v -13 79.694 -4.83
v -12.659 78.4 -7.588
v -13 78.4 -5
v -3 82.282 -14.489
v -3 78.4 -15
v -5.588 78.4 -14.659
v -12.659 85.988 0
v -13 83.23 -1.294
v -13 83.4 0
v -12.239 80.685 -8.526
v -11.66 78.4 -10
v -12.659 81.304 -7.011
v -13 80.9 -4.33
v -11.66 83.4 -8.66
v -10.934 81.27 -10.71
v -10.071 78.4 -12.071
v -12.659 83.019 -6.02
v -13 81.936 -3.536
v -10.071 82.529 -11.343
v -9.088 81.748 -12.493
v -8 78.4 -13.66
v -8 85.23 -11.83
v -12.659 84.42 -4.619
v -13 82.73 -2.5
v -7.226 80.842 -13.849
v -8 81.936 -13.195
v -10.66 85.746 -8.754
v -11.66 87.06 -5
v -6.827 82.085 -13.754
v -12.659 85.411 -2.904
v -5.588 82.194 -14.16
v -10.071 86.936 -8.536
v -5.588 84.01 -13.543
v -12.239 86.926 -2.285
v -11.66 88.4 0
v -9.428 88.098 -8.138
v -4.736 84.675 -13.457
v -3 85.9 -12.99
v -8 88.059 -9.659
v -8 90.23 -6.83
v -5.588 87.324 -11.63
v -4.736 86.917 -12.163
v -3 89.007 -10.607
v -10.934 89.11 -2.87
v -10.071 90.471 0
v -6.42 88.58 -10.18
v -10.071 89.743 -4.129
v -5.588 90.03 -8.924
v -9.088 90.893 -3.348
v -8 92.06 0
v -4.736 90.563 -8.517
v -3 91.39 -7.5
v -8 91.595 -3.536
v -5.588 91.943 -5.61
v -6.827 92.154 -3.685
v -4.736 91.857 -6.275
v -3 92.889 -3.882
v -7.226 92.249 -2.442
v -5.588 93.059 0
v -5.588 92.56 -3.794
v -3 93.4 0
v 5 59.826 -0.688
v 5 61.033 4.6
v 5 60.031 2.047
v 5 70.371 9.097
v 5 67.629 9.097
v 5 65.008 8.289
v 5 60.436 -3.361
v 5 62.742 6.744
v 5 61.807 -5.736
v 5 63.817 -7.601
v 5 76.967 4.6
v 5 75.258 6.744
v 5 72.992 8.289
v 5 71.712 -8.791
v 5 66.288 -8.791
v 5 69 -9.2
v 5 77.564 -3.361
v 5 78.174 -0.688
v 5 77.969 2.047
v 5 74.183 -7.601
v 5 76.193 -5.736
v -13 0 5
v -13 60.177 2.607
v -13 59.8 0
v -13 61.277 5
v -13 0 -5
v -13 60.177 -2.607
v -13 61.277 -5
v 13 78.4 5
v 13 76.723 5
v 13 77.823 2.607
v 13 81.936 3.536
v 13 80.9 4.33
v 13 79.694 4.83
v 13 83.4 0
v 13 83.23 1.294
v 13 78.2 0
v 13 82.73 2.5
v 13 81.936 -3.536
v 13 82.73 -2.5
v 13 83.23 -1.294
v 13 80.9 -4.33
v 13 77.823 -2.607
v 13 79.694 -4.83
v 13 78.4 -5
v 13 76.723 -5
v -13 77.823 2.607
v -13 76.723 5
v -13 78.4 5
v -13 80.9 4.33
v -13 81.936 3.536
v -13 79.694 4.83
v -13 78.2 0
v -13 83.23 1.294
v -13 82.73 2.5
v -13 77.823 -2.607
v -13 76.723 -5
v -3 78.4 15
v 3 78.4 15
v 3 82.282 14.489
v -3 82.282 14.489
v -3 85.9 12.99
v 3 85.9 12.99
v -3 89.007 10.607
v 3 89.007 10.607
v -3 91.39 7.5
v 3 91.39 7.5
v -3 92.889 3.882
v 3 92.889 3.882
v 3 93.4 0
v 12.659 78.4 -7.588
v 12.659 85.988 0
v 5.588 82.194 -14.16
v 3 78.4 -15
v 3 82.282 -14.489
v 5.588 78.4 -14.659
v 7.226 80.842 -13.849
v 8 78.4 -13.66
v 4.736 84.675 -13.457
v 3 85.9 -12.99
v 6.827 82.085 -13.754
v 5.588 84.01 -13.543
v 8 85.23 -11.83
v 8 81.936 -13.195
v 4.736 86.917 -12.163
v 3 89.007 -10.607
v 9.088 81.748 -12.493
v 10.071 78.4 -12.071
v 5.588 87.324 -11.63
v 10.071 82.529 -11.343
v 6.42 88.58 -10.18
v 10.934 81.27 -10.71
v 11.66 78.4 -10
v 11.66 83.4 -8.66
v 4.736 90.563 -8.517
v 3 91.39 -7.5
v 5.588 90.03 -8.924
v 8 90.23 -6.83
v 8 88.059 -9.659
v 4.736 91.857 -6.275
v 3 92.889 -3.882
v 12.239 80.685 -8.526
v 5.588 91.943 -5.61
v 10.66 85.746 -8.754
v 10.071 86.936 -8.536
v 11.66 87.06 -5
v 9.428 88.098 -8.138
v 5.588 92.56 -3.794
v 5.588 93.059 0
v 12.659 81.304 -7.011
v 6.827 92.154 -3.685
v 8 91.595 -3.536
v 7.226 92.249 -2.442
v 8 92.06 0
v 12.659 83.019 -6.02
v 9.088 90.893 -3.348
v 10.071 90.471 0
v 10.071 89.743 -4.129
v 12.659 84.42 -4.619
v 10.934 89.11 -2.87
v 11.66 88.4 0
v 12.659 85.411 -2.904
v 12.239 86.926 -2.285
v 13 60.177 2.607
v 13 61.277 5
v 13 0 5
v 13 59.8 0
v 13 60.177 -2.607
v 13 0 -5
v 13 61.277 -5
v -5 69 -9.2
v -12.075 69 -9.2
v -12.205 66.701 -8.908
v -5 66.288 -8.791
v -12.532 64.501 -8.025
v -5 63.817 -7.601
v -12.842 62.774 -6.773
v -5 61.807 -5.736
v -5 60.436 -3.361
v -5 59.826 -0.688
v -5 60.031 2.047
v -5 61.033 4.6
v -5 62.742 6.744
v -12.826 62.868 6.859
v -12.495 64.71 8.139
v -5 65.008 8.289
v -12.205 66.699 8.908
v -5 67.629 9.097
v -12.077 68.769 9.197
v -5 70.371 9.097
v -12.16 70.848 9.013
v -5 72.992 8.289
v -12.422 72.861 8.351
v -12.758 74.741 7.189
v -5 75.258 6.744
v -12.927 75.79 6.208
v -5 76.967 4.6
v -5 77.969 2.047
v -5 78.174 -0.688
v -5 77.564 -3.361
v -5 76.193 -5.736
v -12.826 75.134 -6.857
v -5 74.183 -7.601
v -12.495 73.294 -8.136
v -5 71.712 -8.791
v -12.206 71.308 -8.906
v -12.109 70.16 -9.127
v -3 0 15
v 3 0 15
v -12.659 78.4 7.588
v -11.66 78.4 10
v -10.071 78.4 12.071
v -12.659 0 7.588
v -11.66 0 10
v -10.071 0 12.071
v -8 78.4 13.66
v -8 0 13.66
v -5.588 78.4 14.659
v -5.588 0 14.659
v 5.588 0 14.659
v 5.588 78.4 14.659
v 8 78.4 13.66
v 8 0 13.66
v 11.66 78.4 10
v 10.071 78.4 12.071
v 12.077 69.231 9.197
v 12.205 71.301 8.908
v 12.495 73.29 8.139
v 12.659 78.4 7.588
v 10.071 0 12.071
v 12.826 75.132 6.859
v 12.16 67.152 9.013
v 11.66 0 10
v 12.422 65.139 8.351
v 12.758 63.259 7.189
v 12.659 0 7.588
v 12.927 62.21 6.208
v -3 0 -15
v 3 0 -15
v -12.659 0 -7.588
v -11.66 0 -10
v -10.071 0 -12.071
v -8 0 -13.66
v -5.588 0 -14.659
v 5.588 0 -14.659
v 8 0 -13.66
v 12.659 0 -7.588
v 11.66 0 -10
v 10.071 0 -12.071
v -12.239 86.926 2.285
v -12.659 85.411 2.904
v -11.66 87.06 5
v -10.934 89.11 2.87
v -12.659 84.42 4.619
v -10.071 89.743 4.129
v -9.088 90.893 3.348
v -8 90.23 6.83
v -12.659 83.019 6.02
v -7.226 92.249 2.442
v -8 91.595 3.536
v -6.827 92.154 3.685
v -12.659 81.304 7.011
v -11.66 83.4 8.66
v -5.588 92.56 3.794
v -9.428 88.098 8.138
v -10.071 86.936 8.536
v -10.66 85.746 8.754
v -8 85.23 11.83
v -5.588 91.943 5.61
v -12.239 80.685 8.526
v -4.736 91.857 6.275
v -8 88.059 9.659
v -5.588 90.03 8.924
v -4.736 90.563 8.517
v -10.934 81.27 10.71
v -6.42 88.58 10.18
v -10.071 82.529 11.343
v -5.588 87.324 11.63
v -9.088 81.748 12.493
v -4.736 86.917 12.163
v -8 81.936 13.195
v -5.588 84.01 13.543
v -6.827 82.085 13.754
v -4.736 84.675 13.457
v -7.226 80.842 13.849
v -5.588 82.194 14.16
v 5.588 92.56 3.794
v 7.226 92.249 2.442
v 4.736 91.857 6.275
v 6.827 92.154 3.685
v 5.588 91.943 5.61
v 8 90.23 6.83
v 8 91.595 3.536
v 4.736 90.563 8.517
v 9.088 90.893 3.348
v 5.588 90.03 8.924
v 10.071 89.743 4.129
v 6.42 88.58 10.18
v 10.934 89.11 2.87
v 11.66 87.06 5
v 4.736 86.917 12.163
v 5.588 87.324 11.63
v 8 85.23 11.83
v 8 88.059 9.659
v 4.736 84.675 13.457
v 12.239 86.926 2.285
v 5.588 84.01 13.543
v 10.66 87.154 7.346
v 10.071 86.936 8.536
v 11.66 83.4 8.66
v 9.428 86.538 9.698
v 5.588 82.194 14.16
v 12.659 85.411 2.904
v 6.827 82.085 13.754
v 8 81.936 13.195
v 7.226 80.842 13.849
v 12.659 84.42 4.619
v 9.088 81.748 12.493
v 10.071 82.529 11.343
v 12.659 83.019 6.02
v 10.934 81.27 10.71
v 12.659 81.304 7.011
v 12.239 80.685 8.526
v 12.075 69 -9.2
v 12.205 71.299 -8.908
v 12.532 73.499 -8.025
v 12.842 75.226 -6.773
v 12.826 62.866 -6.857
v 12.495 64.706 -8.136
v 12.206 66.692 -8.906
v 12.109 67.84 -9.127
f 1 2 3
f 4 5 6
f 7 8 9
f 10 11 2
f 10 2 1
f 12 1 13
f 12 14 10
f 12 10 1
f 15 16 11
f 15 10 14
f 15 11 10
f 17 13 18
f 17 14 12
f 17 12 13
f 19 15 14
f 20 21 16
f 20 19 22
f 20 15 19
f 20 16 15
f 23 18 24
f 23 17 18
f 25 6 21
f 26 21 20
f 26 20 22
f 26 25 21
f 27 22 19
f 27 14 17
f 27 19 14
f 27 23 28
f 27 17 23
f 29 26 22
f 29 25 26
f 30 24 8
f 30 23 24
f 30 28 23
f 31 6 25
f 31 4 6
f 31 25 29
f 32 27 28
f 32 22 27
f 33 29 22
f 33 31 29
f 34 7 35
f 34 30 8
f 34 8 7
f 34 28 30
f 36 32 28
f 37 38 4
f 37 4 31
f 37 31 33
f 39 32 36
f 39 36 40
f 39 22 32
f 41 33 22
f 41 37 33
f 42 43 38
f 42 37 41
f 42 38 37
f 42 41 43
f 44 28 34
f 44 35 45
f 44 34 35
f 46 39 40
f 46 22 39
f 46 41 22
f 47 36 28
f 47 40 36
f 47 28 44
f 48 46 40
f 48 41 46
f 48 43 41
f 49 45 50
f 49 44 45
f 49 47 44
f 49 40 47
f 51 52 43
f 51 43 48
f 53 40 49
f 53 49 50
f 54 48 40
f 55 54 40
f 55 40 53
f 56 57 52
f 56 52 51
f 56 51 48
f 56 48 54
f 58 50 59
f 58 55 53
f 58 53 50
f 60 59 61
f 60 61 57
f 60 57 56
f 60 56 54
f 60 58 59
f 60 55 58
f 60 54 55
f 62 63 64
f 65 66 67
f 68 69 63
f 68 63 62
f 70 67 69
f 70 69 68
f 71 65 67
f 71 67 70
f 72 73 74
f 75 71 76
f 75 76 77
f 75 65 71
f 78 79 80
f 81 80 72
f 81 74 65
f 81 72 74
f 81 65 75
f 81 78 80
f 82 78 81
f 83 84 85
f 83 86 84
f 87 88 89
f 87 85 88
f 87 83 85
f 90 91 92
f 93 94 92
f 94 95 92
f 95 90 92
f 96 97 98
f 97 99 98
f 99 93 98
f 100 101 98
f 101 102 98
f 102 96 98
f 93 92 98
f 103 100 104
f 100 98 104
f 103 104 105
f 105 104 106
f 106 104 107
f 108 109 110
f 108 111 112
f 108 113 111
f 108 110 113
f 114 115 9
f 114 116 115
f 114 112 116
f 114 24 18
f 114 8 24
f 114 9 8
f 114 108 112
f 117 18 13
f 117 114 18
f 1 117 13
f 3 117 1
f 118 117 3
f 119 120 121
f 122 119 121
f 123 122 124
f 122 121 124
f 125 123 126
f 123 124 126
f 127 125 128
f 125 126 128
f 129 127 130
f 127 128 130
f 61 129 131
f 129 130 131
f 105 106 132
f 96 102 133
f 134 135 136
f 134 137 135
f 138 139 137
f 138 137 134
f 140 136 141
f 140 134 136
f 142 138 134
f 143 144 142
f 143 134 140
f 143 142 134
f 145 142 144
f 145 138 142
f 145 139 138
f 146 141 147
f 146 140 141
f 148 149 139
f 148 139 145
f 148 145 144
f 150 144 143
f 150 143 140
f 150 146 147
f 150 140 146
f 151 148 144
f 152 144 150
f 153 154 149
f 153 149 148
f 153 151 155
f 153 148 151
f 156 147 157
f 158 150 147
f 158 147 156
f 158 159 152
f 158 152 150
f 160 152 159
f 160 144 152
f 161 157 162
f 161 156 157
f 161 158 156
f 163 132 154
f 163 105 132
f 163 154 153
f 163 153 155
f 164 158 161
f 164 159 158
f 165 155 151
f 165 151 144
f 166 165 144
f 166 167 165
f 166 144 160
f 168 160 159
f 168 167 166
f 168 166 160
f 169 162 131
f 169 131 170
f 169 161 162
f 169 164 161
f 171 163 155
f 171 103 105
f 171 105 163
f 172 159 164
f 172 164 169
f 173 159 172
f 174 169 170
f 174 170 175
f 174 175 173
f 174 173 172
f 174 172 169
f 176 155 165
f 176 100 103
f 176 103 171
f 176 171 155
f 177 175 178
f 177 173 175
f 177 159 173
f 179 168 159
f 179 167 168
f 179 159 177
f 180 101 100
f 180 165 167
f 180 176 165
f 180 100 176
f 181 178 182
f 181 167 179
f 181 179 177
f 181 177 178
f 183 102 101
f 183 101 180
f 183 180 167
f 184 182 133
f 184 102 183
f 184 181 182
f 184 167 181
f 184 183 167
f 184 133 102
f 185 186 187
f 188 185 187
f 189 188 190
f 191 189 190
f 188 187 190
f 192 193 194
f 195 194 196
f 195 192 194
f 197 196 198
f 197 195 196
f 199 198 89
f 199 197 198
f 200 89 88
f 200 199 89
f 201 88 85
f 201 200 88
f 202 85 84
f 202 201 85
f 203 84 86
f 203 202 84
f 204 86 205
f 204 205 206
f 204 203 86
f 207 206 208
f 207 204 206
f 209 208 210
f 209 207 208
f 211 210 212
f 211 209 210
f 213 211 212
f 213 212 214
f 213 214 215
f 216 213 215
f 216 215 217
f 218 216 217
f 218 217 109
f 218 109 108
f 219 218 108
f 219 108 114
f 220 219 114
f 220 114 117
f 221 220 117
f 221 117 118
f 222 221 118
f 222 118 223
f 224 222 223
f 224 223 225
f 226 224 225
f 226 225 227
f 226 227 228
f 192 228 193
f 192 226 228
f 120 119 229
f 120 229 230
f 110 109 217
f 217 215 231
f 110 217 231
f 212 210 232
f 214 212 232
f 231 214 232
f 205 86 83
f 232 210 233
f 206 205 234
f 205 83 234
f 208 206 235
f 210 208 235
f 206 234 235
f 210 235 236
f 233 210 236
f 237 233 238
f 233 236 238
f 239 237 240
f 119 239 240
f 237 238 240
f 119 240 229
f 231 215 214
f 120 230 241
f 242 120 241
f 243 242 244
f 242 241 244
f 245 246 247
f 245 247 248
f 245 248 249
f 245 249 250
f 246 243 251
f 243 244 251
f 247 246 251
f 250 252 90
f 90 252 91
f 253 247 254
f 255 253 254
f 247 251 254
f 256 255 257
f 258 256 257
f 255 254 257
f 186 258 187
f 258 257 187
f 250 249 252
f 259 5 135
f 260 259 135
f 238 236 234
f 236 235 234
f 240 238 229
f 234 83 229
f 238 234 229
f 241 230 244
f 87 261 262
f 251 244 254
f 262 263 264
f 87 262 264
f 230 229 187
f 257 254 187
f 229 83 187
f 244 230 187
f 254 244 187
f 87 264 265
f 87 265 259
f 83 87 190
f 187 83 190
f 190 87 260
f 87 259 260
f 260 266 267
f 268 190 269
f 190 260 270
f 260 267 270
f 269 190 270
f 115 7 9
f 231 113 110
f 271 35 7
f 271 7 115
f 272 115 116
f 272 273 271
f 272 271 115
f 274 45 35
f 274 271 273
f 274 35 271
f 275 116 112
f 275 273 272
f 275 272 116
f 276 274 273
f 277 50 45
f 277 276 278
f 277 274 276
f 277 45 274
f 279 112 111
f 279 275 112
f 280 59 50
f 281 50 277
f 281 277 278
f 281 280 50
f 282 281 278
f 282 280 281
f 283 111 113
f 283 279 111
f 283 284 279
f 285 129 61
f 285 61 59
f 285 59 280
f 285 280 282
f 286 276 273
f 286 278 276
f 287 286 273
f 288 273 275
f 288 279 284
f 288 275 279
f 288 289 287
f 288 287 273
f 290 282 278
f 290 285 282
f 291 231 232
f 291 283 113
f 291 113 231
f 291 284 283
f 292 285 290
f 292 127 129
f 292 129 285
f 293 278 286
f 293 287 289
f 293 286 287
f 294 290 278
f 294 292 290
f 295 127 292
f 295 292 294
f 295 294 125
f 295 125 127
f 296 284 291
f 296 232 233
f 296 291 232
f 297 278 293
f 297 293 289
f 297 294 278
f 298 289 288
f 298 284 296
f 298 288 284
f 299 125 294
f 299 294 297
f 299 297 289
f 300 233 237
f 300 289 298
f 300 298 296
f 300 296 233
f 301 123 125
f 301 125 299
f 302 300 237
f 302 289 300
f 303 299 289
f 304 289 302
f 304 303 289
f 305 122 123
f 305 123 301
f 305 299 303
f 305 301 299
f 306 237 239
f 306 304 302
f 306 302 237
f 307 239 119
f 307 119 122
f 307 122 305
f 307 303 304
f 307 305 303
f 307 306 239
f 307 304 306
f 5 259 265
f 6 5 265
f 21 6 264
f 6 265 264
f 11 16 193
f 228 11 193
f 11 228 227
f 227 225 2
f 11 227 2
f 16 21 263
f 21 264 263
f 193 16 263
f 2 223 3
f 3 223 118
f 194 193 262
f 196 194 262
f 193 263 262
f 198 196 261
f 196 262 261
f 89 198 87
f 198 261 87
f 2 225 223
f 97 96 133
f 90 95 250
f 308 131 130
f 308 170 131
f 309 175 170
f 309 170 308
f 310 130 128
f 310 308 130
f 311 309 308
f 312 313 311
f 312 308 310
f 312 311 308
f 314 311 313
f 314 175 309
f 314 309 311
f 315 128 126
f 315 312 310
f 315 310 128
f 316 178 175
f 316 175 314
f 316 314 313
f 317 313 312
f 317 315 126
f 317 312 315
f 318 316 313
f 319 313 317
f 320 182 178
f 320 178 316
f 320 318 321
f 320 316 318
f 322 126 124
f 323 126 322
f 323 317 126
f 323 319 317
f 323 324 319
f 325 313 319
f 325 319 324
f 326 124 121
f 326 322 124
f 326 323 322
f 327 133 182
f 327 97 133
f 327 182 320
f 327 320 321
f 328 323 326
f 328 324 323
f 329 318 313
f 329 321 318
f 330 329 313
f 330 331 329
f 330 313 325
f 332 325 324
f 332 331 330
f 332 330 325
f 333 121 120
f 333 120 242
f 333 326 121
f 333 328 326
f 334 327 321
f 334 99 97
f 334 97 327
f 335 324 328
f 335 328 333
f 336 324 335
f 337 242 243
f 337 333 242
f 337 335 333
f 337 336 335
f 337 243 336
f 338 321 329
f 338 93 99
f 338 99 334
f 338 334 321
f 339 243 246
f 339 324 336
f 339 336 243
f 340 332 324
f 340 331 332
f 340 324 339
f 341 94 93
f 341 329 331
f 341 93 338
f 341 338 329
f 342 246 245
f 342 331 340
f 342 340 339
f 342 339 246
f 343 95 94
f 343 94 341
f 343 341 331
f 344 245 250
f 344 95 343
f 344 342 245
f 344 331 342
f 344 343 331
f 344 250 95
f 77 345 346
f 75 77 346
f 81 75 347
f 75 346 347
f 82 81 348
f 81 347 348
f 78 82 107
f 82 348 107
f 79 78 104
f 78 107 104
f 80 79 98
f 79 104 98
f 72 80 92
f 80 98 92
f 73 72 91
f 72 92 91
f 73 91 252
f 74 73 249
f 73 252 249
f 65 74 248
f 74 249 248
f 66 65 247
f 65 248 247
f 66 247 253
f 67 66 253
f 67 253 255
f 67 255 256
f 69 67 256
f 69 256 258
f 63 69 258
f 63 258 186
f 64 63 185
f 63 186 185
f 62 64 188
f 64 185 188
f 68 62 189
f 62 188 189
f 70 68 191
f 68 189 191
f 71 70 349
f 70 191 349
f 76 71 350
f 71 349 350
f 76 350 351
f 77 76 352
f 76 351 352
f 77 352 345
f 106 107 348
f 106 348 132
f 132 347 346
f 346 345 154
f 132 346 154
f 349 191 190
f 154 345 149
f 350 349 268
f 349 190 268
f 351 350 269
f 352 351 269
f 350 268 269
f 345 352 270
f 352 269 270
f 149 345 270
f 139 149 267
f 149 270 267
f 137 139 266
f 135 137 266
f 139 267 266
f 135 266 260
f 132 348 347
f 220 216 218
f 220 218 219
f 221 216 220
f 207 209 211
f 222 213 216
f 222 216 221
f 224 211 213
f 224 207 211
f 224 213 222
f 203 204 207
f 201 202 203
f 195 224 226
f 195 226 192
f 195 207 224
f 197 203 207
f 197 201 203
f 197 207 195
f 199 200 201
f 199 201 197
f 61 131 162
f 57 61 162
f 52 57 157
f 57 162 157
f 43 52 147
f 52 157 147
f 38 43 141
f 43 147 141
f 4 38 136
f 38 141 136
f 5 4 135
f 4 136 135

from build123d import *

# Parameters (mm, degrees)
SKETCH2_W           = 26
SKETCH2_H           = 30
BOSS_EXTRUDE1_DEPTH = 93.4
SKETCH3_R           = 9.2
CUT_EXTRUDE1_DEPTH  = 8
CUT_EXTRUDE2_START  = -8
SKETCH4_R           = 9.2
CUT_EXTRUDE2_DEPTH  = 8
FILLET1_R           = 15
FILLET4_R           = 10
FILLET5_R           = 10


# Some blends are built 0.0001 mm under size
with BuildPart() as part:
    # Sketch2 → Boss-Extrude1 (new body)
    with BuildSketch(Plane(origin=(0, 0, 0), x_dir=(1, 0, 0), z_dir=(0, 1, 0))):
        Rectangle(SKETCH2_W, SKETCH2_H)
    extrude(amount=BOSS_EXTRUDE1_DEPTH)

    # Sketch3 → Cut-Extrude1 (cut)
    with BuildSketch(Plane(origin=(13, 0, 0), x_dir=(0, 0, -1), z_dir=(1, 0, 0))):
        with Locations((0, 69)):
            Circle(SKETCH3_R)
    extrude(amount=-CUT_EXTRUDE1_DEPTH, mode=Mode.SUBTRACT)

    # Sketch4 → Cut-Extrude2 (cut)
    with BuildSketch(Plane.ZY.offset(13).offset(CUT_EXTRUDE2_START)):
        with Locations(Location((0, 69, 0), (0, 0, 180))):
            Circle(SKETCH4_R)
    extrude(amount=CUT_EXTRUDE2_DEPTH, mode=Mode.SUBTRACT)

    # Fillet1
    fillet1_edges = [part.edges().sort_by_distance(p)[0] for p in [
        (0, 93.4, 15),
        (0, 93.4, -15),
    ]]
    fillet(fillet1_edges, radius=FILLET1_R - 0.0001)  # a hair under: the kernel refuses the full size

    # Fillet4
    # the kernel refuses this fillet: 10 mm, written as the material it takes off along each edge
    with BuildSketch(Plane(origin=(-13, -25, 15), x_dir=(0, 0, -1), z_dir=(0, 1, 0)), Plane(origin=(-13, -25, -15), x_dir=(1, 0, 0), z_dir=(0, 1, 0))) as fillet4_piece_1:
        with BuildLine():
            CenterArc((FILLET4_R, -FILLET4_R), FILLET4_R, 90, 90)
            Line((0, -FILLET4_R), (0, 0))
            Line((0, 0), (FILLET4_R, 0))
        make_face()
    extrude(amount=103.4001, mode=Mode.SUBTRACT)
    with BuildSketch(Plane(origin=(-13, 78.4001, -0.0001), x_dir=(0, 0, -1), z_dir=(0, -1, 0))) as fillet4_piece_2:
        with BuildLine():
            CenterArc((14.9999 - FILLET4_R, FILLET4_R), FILLET4_R, 270, 90)
            Line((14.9999, FILLET4_R), (14.9999, 0))
            Line((14.9999, 0), (14.9999 - FILLET4_R, 0))
        make_face()
    revolve(axis=Axis((-13, 78.4001, -0.0001), (1, 0, 0)), revolution_arc=90, mode=Mode.SUBTRACT)
    with BuildSketch(Plane(origin=(-13, 78.4001, 0.0001), x_dir=(0, 1, 0), z_dir=(0, 0, -1))) as fillet4_piece_3:
        with BuildLine():
            CenterArc((14.9999 - FILLET4_R, FILLET4_R), FILLET4_R, 270, 90)
            Line((14.9999, FILLET4_R), (14.9999, 0))
            Line((14.9999, 0), (14.9999 - FILLET4_R, 0))
        make_face()
    revolve(axis=Axis((-13, 78.4001, 0.0001), (1, 0, 0)), revolution_arc=90, mode=Mode.SUBTRACT)
    with BuildSketch(Plane(origin=(-13, 93.4, 0.0001), x_dir=(0, -1, 0), z_dir=(0, 0, -1))) as fillet4_piece_4:
        with BuildLine():
            CenterArc((FILLET4_R, -FILLET4_R), FILLET4_R, 90, 90)
            Line((0, -FILLET4_R), (0, 0))
            Line((0, 0), (FILLET4_R, 0))
        make_face()
    extrude(amount=0.0002, mode=Mode.SUBTRACT)

    # Fillet5
    # the kernel refuses this fillet: 10 mm, written as the material it takes off along each edge
    with BuildSketch(Plane(origin=(13, -25, -15), x_dir=(-1, 0, 0), z_dir=(0, 1, 0)), Plane(origin=(13, -25, 15), x_dir=(0, 0, -1), z_dir=(0, 1, 0))) as fillet5_piece_1:
        with BuildLine():
            CenterArc((FILLET5_R, FILLET5_R), FILLET5_R, 180, 90)
            Line((0, FILLET5_R), (0, 0))
            Line((0, 0), (FILLET5_R, 0))
        make_face()
    extrude(amount=103.4001, mode=Mode.SUBTRACT)
    with BuildSketch(Plane(origin=(13, 78.4001, -0.0001), x_dir=(0, 0, -1), z_dir=(0, -1, 0))) as fillet5_piece_2:
        with BuildLine():
            CenterArc((14.9999 - FILLET5_R, -FILLET5_R), FILLET5_R, 0, 90)
            Line((14.9999, -FILLET5_R), (14.9999, 0))
            Line((14.9999, 0), (14.9999 - FILLET5_R, 0))
        make_face()
    revolve(axis=Axis((13, 78.4001, -0.0001), (1, 0, 0)), revolution_arc=90, mode=Mode.SUBTRACT)
    with BuildSketch(Plane(origin=(13, 78.4001, 0.0001), x_dir=(0, 1, 0), z_dir=(0, 0, -1))) as fillet5_piece_3:
        with BuildLine():
            CenterArc((14.9999 - FILLET5_R, -FILLET5_R), FILLET5_R, 0, 90)
            Line((14.9999, -FILLET5_R), (14.9999, 0))
            Line((14.9999, 0), (14.9999 - FILLET5_R, 0))
        make_face()
    revolve(axis=Axis((13, 78.4001, 0.0001), (1, 0, 0)), revolution_arc=90, mode=Mode.SUBTRACT)
    with BuildSketch(Plane(origin=(13, 93.4, -0.0001), x_dir=(0, -1, 0), z_dir=(0, 0, 1))) as fillet5_piece_4:
        with BuildLine():
            CenterArc((FILLET5_R, -FILLET5_R), FILLET5_R, 90, 90)
            Line((0, -FILLET5_R), (0, 0))
            Line((0, 0), (FILLET5_R, 0))
        make_face()
    extrude(amount=0.0002, mode=Mode.SUBTRACT)


solid = part.part
